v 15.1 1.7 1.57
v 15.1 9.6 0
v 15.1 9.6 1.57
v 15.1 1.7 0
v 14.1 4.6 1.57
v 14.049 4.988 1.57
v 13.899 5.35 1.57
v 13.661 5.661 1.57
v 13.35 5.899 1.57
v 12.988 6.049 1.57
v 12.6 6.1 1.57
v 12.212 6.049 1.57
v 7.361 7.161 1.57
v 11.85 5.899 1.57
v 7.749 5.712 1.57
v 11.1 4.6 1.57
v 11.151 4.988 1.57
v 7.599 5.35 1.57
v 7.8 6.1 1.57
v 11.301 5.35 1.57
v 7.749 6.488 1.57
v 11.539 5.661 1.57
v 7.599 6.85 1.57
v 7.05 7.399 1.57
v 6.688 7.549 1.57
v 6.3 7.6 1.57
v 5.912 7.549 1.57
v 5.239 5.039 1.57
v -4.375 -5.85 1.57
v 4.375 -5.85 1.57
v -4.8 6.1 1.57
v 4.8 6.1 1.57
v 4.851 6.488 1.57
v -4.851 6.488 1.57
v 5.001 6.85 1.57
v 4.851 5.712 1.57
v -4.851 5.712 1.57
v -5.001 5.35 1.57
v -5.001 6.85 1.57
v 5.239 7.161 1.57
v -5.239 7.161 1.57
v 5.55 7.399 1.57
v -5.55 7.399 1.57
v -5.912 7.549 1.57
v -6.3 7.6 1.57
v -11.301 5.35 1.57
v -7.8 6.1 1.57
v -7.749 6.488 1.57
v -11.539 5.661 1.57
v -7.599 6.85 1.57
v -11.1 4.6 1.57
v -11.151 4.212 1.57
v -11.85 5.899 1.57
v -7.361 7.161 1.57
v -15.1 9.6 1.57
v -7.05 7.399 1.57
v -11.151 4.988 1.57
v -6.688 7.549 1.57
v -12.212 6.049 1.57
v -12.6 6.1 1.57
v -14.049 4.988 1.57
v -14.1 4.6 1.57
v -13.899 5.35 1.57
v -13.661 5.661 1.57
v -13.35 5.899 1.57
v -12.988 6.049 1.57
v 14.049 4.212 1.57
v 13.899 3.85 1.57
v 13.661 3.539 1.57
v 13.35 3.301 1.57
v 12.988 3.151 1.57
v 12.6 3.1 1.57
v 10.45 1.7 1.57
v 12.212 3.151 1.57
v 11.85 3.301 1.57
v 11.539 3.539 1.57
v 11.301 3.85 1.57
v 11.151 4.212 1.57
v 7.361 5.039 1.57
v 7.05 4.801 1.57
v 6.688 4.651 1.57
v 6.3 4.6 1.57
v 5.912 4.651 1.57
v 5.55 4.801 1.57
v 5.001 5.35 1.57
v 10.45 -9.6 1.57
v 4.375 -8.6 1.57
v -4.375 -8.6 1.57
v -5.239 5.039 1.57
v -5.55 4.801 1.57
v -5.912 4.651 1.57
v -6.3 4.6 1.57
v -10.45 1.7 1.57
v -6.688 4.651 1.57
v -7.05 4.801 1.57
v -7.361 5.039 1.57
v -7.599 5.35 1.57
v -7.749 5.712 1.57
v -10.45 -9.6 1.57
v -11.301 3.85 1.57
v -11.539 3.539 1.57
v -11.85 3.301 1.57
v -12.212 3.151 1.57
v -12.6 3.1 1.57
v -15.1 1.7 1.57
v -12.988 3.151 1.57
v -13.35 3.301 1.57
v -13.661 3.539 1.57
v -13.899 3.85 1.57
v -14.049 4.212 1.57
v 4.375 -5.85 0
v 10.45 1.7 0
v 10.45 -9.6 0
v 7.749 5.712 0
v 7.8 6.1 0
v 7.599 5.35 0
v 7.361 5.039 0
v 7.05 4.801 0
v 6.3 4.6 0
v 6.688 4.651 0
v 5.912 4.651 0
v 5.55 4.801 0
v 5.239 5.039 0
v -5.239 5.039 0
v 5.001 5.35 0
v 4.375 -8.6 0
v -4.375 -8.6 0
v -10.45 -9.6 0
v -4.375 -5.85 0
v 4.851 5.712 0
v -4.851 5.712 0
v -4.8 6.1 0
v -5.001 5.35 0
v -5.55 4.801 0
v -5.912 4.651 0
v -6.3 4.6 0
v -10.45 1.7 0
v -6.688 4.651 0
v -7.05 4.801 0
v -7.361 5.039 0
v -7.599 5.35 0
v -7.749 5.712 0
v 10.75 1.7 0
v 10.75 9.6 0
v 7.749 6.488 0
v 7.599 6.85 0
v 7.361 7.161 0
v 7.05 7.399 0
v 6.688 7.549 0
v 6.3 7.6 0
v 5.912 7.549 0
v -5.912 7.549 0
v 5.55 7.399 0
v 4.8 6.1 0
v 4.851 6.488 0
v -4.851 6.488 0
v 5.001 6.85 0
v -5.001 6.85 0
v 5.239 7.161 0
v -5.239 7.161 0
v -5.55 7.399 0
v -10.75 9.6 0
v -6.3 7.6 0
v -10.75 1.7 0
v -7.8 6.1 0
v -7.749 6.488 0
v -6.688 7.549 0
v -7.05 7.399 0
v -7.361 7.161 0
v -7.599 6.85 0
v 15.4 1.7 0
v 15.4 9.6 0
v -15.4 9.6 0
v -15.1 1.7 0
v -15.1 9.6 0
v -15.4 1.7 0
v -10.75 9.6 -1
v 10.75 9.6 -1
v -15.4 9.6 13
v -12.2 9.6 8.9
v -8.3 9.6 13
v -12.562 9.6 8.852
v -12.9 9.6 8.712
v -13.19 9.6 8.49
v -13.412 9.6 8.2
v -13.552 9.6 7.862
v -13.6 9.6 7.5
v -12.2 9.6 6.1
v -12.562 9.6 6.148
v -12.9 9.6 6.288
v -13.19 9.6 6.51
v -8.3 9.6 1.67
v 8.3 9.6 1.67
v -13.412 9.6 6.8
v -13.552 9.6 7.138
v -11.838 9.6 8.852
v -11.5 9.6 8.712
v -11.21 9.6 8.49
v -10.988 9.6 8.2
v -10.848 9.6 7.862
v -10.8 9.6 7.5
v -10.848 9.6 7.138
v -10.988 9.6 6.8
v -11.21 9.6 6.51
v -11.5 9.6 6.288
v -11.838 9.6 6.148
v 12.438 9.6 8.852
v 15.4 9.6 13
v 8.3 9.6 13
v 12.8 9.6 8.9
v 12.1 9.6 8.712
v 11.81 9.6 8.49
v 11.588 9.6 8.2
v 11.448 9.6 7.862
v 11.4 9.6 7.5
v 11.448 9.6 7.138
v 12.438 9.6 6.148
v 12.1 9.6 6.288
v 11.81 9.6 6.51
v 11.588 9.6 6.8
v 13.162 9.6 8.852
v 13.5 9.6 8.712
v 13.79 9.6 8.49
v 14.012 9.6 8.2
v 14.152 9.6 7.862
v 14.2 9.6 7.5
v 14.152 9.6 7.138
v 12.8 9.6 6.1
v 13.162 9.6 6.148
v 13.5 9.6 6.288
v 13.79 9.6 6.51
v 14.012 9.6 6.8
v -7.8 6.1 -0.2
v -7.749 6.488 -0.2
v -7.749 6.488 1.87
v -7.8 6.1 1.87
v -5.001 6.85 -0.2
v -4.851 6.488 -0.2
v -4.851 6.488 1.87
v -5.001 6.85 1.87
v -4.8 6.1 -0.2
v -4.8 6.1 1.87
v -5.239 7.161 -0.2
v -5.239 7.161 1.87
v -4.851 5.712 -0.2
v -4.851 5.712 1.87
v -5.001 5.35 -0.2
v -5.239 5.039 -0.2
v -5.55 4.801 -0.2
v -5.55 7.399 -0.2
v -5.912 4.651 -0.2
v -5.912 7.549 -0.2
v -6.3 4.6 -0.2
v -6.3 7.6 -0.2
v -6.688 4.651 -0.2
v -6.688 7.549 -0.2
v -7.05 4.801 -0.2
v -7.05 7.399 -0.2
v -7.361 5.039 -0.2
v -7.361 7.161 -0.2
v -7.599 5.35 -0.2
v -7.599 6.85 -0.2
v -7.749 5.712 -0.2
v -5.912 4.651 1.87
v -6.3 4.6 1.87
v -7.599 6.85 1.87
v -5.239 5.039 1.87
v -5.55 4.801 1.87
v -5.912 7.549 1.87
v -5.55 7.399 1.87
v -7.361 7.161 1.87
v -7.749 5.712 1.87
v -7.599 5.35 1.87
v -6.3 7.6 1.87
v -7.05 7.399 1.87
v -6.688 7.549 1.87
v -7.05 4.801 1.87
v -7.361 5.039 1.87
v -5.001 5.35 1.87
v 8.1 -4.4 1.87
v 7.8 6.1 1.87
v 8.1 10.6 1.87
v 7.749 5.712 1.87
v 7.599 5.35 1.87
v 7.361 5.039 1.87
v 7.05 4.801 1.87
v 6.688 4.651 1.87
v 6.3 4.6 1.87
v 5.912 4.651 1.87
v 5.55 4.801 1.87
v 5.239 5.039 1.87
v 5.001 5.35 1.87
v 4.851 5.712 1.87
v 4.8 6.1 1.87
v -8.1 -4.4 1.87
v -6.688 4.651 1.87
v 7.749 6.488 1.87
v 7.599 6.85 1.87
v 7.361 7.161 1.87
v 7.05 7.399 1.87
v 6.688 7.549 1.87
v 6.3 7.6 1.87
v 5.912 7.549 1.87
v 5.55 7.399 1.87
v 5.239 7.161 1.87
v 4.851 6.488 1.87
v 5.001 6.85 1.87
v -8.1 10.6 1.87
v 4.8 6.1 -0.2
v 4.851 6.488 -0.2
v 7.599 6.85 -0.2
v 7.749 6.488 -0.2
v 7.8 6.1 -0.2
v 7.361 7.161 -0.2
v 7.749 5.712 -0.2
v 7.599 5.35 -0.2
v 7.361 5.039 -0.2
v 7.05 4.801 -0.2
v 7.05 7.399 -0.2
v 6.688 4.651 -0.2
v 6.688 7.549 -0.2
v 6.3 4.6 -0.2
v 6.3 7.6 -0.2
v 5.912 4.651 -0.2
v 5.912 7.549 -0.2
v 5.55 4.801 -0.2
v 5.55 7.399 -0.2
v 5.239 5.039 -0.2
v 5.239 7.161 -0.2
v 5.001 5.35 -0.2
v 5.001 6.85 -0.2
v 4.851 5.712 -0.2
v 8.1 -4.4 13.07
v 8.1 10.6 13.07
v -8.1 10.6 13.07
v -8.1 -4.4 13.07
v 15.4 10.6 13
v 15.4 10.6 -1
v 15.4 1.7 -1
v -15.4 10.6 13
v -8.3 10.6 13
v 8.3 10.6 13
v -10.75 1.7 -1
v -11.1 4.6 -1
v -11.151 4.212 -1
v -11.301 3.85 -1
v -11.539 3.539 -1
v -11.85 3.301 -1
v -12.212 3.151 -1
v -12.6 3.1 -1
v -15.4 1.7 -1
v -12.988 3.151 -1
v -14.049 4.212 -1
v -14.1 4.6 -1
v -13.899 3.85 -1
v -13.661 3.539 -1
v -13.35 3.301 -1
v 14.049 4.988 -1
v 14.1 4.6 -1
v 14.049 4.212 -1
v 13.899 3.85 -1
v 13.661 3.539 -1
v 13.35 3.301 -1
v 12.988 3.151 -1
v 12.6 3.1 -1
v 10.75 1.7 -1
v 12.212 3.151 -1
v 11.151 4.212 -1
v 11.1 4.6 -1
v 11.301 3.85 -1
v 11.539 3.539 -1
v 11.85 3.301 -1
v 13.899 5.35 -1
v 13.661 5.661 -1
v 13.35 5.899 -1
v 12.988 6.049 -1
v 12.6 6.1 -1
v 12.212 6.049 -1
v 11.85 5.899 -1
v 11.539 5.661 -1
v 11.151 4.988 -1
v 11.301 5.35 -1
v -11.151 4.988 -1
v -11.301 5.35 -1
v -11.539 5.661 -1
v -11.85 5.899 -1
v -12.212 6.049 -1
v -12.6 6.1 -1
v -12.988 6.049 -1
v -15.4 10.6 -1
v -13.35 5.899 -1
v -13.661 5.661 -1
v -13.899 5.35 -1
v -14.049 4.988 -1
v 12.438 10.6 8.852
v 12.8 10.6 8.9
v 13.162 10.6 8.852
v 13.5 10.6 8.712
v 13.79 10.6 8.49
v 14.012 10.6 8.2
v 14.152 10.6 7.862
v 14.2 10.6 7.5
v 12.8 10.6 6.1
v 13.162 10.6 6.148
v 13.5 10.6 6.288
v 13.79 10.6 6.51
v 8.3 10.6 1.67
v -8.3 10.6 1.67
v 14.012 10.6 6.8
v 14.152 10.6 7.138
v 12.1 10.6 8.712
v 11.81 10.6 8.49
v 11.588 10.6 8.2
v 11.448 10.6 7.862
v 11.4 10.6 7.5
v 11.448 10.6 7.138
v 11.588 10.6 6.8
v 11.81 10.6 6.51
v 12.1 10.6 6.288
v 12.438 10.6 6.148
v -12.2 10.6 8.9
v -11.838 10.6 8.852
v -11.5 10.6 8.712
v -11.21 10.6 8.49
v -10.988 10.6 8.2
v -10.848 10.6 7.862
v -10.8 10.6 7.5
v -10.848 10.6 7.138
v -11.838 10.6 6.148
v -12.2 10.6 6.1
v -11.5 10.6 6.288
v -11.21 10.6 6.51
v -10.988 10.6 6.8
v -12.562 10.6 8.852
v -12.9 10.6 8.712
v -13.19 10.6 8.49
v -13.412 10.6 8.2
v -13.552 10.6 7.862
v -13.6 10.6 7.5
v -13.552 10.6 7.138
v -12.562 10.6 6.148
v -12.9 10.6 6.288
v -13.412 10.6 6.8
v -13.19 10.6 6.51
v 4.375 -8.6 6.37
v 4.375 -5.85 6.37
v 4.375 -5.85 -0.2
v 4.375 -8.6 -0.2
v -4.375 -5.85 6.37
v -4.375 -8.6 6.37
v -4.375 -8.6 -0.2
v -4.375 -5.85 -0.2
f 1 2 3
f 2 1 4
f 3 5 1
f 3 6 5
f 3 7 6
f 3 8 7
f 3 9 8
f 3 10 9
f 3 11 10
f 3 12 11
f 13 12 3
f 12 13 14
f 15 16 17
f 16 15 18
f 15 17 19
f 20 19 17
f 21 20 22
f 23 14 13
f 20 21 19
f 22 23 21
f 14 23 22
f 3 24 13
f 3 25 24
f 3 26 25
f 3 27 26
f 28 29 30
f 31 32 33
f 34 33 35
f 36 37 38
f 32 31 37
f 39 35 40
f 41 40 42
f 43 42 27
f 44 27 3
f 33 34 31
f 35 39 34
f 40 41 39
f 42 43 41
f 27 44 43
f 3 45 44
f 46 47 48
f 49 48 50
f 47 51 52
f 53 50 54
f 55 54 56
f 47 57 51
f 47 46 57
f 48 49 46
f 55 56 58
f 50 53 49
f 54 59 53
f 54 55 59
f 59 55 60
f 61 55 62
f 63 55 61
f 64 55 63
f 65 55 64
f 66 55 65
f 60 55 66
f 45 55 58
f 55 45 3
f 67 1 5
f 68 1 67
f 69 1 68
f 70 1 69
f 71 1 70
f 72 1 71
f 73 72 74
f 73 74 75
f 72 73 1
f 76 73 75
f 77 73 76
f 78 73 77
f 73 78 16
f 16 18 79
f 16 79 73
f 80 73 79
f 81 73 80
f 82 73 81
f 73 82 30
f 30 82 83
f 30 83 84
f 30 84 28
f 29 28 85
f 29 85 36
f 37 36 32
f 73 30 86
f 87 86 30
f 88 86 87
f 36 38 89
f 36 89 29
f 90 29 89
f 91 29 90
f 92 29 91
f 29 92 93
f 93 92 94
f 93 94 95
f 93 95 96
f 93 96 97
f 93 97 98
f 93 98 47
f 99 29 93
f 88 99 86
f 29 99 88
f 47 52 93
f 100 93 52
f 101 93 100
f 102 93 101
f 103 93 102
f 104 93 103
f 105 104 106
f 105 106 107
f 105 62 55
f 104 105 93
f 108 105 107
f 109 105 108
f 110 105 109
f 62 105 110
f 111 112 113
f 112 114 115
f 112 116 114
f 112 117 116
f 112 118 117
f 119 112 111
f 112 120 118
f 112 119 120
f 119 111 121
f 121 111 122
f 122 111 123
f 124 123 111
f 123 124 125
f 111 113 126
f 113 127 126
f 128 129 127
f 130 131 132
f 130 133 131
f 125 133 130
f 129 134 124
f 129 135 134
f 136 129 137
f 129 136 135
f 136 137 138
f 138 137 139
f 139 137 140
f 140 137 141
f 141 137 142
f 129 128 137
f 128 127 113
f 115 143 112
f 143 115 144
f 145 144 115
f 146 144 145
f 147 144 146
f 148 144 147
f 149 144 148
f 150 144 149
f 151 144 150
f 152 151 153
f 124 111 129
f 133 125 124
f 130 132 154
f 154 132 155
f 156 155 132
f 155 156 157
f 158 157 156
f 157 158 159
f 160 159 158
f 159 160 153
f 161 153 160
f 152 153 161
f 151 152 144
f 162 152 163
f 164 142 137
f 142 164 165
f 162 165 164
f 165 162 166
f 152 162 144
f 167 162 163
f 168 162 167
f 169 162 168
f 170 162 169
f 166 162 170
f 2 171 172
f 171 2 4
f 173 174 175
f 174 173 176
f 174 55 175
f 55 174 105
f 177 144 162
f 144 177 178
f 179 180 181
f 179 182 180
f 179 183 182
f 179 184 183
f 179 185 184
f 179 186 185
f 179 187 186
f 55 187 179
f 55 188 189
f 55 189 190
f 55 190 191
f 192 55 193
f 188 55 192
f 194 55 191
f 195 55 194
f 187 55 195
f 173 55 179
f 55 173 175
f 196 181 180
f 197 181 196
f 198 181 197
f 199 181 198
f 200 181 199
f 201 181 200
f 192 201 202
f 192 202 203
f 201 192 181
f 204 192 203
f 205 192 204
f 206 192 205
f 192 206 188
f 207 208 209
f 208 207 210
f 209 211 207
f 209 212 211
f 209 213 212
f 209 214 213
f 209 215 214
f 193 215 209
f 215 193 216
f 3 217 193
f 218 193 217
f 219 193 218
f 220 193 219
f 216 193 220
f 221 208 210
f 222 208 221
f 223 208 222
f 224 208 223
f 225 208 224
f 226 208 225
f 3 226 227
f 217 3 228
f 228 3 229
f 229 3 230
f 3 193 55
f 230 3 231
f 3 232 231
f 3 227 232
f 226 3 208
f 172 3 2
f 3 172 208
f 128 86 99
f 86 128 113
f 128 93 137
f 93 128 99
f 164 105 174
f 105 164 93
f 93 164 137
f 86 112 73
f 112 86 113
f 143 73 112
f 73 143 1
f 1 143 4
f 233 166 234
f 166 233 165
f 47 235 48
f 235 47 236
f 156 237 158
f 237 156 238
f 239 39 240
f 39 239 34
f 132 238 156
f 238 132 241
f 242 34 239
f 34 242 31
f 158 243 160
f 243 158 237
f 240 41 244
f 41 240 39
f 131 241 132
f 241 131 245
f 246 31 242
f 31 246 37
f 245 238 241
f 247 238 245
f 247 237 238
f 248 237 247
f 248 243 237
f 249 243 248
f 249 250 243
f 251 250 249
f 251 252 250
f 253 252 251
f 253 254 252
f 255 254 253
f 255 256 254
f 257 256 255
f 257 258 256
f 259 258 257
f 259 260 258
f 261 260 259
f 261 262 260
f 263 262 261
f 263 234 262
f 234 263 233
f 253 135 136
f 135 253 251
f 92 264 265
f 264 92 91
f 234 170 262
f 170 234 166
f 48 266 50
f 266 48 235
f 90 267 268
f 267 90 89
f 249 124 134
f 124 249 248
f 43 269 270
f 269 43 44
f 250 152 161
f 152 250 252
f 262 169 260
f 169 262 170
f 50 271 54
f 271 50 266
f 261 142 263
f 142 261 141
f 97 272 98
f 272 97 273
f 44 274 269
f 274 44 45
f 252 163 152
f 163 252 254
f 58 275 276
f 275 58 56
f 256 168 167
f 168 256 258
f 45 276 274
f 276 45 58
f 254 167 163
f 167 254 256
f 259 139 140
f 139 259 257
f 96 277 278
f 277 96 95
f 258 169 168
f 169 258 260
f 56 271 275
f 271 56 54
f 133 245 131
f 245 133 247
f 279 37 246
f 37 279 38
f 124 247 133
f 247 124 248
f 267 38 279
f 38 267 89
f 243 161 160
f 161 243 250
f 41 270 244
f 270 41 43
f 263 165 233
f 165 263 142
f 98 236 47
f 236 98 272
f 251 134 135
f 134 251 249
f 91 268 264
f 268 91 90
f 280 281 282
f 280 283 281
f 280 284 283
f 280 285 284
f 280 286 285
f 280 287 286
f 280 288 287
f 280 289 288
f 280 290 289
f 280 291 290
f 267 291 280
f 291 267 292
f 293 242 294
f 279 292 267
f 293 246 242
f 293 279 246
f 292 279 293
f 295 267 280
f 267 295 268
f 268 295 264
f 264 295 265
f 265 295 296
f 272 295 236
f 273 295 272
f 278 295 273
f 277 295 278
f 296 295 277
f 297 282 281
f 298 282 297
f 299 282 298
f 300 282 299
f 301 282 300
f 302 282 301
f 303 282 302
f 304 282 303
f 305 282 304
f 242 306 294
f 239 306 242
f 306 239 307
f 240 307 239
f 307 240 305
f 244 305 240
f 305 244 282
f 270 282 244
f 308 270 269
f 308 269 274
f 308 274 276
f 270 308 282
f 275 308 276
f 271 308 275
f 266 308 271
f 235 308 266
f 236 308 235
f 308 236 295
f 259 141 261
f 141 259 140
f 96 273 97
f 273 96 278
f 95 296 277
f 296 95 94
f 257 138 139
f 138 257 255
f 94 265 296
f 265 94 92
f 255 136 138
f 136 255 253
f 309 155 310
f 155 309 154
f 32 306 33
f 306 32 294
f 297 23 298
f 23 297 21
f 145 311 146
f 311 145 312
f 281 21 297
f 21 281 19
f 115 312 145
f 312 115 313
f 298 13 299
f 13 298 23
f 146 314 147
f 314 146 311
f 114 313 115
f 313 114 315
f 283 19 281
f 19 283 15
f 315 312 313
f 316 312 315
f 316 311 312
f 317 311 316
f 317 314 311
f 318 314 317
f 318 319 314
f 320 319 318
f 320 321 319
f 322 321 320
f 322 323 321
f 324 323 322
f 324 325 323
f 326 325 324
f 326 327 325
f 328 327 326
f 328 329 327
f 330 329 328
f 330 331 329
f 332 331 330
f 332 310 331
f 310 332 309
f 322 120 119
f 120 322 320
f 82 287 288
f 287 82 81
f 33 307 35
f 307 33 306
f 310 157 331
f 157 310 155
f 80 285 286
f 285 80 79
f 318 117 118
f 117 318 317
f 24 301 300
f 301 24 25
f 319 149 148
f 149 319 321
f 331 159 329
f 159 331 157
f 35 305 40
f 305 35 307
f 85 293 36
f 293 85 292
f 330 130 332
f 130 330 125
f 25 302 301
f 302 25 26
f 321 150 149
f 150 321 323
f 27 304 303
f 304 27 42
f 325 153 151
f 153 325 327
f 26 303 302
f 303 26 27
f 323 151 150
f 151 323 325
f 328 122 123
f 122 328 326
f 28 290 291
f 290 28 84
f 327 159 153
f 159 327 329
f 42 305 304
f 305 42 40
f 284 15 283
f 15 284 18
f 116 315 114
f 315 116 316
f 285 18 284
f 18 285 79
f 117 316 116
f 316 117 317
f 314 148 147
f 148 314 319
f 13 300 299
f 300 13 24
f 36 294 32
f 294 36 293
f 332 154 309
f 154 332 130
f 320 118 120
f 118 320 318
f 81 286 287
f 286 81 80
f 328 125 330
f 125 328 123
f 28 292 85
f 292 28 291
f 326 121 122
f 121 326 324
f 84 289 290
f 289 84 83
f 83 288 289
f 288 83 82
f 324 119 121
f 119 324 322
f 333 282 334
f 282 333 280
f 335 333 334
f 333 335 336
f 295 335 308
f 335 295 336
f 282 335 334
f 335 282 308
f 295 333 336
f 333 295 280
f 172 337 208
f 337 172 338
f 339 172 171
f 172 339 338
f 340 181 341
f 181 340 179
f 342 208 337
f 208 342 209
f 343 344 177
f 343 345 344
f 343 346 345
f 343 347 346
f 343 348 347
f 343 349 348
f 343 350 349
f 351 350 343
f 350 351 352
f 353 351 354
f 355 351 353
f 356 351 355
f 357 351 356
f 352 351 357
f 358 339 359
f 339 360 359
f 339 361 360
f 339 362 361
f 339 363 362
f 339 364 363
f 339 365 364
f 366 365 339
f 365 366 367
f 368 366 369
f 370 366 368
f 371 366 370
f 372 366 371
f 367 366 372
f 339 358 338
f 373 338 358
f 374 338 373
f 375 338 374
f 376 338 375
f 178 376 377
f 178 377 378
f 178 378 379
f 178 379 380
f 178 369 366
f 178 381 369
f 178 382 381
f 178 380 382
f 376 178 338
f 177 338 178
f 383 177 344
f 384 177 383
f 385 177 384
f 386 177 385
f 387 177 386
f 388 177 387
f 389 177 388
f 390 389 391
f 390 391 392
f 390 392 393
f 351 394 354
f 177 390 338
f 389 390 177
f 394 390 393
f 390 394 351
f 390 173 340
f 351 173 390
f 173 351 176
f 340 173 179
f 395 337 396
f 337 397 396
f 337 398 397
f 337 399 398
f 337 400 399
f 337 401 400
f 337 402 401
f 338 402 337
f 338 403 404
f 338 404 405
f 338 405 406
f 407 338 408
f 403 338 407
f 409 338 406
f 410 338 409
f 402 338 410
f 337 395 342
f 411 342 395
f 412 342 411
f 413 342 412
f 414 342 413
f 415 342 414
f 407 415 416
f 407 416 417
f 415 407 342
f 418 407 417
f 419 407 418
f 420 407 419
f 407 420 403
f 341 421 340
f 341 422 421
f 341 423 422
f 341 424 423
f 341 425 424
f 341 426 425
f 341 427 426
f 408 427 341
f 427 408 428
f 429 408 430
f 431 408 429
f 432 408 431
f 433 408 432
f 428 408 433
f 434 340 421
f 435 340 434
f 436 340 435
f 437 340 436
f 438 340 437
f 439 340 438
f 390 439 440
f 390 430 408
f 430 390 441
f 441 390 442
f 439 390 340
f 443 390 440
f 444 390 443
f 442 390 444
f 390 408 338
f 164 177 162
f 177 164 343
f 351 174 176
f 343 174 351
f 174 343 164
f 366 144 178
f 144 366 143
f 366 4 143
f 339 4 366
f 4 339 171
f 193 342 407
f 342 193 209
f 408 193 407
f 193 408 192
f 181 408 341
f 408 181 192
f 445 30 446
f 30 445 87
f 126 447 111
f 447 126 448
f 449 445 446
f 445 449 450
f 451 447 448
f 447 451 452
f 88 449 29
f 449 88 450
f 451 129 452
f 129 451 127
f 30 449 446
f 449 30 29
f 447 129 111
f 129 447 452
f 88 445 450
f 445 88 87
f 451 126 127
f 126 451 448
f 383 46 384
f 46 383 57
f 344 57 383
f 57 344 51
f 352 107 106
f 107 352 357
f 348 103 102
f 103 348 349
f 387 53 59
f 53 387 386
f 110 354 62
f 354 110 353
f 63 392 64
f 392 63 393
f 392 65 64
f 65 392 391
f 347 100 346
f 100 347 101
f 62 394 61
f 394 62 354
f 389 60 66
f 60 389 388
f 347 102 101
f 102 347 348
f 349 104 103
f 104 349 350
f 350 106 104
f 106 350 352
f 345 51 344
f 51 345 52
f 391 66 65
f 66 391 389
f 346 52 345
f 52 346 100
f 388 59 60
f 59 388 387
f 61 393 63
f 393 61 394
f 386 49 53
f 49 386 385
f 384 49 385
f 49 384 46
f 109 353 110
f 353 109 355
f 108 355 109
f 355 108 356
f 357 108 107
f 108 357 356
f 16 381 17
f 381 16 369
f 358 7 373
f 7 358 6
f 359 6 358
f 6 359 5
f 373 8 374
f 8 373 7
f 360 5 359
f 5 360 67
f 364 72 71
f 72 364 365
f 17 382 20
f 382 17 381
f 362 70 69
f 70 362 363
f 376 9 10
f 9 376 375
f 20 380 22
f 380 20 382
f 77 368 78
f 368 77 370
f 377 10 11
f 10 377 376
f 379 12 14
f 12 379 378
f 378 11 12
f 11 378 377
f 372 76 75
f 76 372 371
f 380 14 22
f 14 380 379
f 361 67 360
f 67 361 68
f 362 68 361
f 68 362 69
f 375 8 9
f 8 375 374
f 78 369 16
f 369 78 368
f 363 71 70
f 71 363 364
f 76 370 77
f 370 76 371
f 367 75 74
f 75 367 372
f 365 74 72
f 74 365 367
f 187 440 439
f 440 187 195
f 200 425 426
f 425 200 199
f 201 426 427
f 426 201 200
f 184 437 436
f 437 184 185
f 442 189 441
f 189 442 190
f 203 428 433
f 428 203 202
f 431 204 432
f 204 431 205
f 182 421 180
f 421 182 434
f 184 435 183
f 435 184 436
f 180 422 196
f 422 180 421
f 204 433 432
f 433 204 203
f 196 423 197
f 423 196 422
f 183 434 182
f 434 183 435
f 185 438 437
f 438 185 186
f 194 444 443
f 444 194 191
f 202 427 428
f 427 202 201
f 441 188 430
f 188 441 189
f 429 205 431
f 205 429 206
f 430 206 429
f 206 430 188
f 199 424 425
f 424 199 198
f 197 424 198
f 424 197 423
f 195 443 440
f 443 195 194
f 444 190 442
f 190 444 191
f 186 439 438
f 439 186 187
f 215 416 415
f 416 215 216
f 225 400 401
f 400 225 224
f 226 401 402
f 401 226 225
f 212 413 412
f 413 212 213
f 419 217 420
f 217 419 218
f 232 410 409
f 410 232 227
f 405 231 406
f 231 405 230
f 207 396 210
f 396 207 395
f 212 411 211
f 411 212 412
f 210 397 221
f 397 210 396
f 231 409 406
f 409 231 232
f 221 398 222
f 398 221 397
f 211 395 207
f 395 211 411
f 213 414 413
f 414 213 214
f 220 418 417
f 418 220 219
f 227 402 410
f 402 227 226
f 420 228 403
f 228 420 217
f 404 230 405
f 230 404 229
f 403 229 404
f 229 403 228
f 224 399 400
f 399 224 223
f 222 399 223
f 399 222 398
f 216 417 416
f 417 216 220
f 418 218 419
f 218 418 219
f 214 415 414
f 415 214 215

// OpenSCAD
// file: smidge.scad
//
// Copyright (c) Stewart H. Whitman, 2020-2021.
//
// File:    smidge.scad
// Project: General
// License: CC BY-NC-SA 4.0 (Attribution-NonCommercial-ShareAlike)
// Desc:    SMIDGE constant used in preview mode.
//

// Smidge constant for rendering only (to avoid Z-axis fighting, etc.)
SMIDGE = $preview ? 0.01 : 0;
// main file
//
// Copyright (c) Stewart H. Whitman, 2021.
//
// File:    winyao-nic.scad
// Project: Dell Wyse 5070 2nd Ethernet Adapter Adapter
// License: CC BY-NC-SA 4.0 (Attribution-NonCommercial-ShareAlike)
// Desc:    Mock-up of the Winyao (DF Robot) Realtek 8111 NIC
//

include <smidge.scad>;

// Winyao Realtek 8111 M.2 Daughter board layout
// Part #: 8111-M2-C
//
// This NIC is an M.2 A+E 2230 with a Realtek Gigabit NIC
// and a tiny daughter board and tiny ribbon cable.
//
// It is available from DFRobot:
// https://www.dfrobot.com/product-2318.html
//
// Also available from various Aliexpress vendors.
//
// All these values were measured. The components/holes
// are symmetric about the Y-axis (side<->side), so some
// values are calculated accordingly.
//
// The shield holes match the layout of DE-9/DE-15 (9-pin
// serial or 15-pin vga) connector, and in fact it can be
// mounted in a serial or VGA cutout with the supplied hardware.
//

// kind:
//
// Unique, for customization.
//
function nic_kind() = "winyao";

// pcb thickness ~1.57mm (nominal 4-layer PCB thickness)
// pcb width X length as measured (about 1.5" x 1")
function nic_get_pcb_size() = [ 30.2, 19.2, 1.57 ];

// ethernet size [left<->right,front<->rear,top<->bottom]
// Close match: Link-PP LPJE4717-2DNL
//              https://www.rj45-modularjack.com/photo/pl26614204-634108150321_rj45_smt_connector_low_profile_ethernet_port_lpje4717_2dnl.jpg
function nic_get_ethernet_size() = [16.2,15.0,11.2];

// shield: thickness
function nic_get_shield_thickness() = 1.0;
// shield: size
function nic_get_shield_size() = [ 30.8, nic_get_shield_thickness(), 14.0 ];
// shield hole position (25mm apart per DE-9 standard) [ left=0, bottom of pcb=0]
function _nic_get_shield_left_hole() = [ nic_get_shield_size().x/2-12.5, 8.5-nic_get_shield_thickness() ];
function _nic_get_shield_right_hole() = [ nic_get_shield_size().x/2+12.5, 8.5-nic_get_shield_thickness() ];
function nic_get_shield_holes() = [ _nic_get_shield_left_hole(), _nic_get_shield_right_hole() ];
// shield hole diameter (measures about 2.8mm)
function nic_get_shield_hole_diameter() = 2.8;
function nic_get_shield_center_pos() = [ nic_get_pcb_size().x/2, nic_get_shield_size().z/2-nic_get_shield_thickness() ];

// ethernet position is equidistant from left or right side (about 7.5mm)
function _nic_get_ethernet_left_pos() = (nic_get_pcb_size().x - nic_get_ethernet_size().x)/2;
function _nic_get_ethernet_right_pos() = (nic_get_pcb_size().x + nic_get_ethernet_size().x)/2;
// N.B.... about 0.3mm between ethernet and PCB
function _nic_get_ethernet_bottom_pos() = nic_get_pcb_size().z + 0.3;
function nic_get_ethernet_center_pos() = [ (_nic_get_ethernet_left_pos()+_nic_get_ethernet_right_pos())/2, _nic_get_ethernet_bottom_pos() + nic_get_ethernet_size().z/2 ];
function nic_get_ethernet_projection() = nic_get_shield_thickness();

// bottom hole positions [left=0, rear=0] - equidistant from both sides
function _nic_get_left_hole() = [ 2.5, nic_get_pcb_size().y - 5];
function _nic_get_right_hole() = [ nic_get_pcb_size().x-2.5, nic_get_pcb_size().y - 5];
function nic_get_bottom_holes() = [ _nic_get_left_hole(), _nic_get_right_hole() ];
// bottom hole diameter (measures about 3mm)
function nic_get_bottom_hole_diameter() = 3.0;

// Layout of the nic board (PCB centered with NIC port hanging out)
module nic(transparency=1.0,center=true,with_shield=true) {
  pcb_cutout = [ (nic_get_pcb_size().x-20.9)/2, nic_get_pcb_size().y-7.9, nic_get_pcb_size().z ];
  shield_thickness = nic_get_shield_thickness();

  module hole(height,diameter) {
    translate( [0,0,-SMIDGE] ) cylinder( h = height+2*SMIDGE, d=diameter );
  } // end hole

  // pcb with notch and hole
  module pcb() {
    color( "green", transparency )
      difference() {
	// board
	cube( nic_get_pcb_size() );
	// notch left
	translate( +[-SMIDGE,-SMIDGE,-SMIDGE] ) cube( pcb_cutout + [SMIDGE, SMIDGE, 2*SMIDGE] );
	// notch right
	translate( [nic_get_pcb_size().x-pcb_cutout.x,0,0]+[+SMIDGE,-SMIDGE,-SMIDGE] ) cube( pcb_cutout + [SMIDGE, SMIDGE, 2*SMIDGE] );
      }
  } // end pcb

  module ethernet() {
    color( "silver", transparency )
      //translate( [_nic_get_ethernet_left_pos(),nic_get_pcb_size().y-nic_get_ethernet_size().y+nic_get_ethernet_projection(),nic_get_pcb_size().z] )
      //  cube( nic_get_ethernet_size() );
      translate( [_nic_get_ethernet_left_pos(), nic_get_pcb_size().y-nic_get_ethernet_size().y+nic_get_ethernet_projection(), _nic_get_ethernet_bottom_pos()] )
        cube( nic_get_ethernet_size() );
    color( "black", transparency ) {
      h = _nic_get_ethernet_bottom_pos()+0.2;
      translate( [_nic_get_ethernet_left_pos()+1.8,nic_get_pcb_size().y-3.5,_nic_get_ethernet_bottom_pos()-h] ) cylinder( h=h, d=3.00 );
      translate( [_nic_get_ethernet_right_pos()-1.8,nic_get_pcb_size().y-3.5,_nic_get_ethernet_bottom_pos()-h] ) cylinder( h=h, d=3.00 );
    }
  } // end ethernet

  module shield() {
    shield_holder    = [ pcb_cutout.x, nic_get_pcb_size().y-pcb_cutout.y, shield_thickness ];
    shield_left_pos  = [ (nic_get_pcb_size().x-nic_get_shield_size().x)/2, nic_get_pcb_size().y, -shield_thickness ];
    shield_right_pos = [ shield_left_pos.x+nic_get_shield_size().x, nic_get_pcb_size().y, -shield_thickness ];
    difference() {
      color( "silver", transparency )
        {
	  translate( shield_left_pos ) cube( nic_get_shield_size() );
	  translate( shield_left_pos-[0,shield_holder.y,0] ) cube( shield_holder );
	  translate( shield_right_pos-[shield_holder.x,shield_holder.y,0] ) cube( shield_holder );
	}
      // Cutout ethernet hole...
      o = 0.2;
      translate( [_nic_get_ethernet_left_pos()-o,nic_get_pcb_size().y-nic_get_ethernet_size().y+nic_get_ethernet_projection(),_nic_get_ethernet_bottom_pos()-o] )
        cube( nic_get_ethernet_size() + 2*[o,o,o] );
    }
  } // end shield

  module header_jp1() {
    // 7x2 @ about 1mm pitch
    header_size = [ 8.75, 2.75, 5+nic_get_pcb_size().z ];
    color( "black", transparency )
      translate( [ nic_get_pcb_size().x/2 - header_size.x/2, 1, -0.2 ] ) cube( header_size );
  } // end header_jp1

  // entire nic
  translate( center ? -[nic_get_pcb_size().x,nic_get_pcb_size().y,0]/2 : [0,0,0] ) {
    difference() {
      union() {
	pcb();
	ethernet();
	header_jp1();

        if( with_shield )
	  shield();
      }

      // Bottom Holes (left and right)
      for( h = nic_get_bottom_holes() )
	translate( concat( h, -shield_thickness ) ) hole( nic_get_pcb_size().z + shield_thickness, nic_get_bottom_hole_diameter() );

      // Vertical Holes (left and right)
      if( with_shield )
	for( h = nic_get_shield_holes() )
	  translate( [h.x, nic_get_pcb_size().y + shield_thickness, h.y] ) rotate( [90,0,0] ) hole( shield_thickness, nic_get_shield_hole_diameter() );
    }
  }
} // end nic

nic($fn=24);
